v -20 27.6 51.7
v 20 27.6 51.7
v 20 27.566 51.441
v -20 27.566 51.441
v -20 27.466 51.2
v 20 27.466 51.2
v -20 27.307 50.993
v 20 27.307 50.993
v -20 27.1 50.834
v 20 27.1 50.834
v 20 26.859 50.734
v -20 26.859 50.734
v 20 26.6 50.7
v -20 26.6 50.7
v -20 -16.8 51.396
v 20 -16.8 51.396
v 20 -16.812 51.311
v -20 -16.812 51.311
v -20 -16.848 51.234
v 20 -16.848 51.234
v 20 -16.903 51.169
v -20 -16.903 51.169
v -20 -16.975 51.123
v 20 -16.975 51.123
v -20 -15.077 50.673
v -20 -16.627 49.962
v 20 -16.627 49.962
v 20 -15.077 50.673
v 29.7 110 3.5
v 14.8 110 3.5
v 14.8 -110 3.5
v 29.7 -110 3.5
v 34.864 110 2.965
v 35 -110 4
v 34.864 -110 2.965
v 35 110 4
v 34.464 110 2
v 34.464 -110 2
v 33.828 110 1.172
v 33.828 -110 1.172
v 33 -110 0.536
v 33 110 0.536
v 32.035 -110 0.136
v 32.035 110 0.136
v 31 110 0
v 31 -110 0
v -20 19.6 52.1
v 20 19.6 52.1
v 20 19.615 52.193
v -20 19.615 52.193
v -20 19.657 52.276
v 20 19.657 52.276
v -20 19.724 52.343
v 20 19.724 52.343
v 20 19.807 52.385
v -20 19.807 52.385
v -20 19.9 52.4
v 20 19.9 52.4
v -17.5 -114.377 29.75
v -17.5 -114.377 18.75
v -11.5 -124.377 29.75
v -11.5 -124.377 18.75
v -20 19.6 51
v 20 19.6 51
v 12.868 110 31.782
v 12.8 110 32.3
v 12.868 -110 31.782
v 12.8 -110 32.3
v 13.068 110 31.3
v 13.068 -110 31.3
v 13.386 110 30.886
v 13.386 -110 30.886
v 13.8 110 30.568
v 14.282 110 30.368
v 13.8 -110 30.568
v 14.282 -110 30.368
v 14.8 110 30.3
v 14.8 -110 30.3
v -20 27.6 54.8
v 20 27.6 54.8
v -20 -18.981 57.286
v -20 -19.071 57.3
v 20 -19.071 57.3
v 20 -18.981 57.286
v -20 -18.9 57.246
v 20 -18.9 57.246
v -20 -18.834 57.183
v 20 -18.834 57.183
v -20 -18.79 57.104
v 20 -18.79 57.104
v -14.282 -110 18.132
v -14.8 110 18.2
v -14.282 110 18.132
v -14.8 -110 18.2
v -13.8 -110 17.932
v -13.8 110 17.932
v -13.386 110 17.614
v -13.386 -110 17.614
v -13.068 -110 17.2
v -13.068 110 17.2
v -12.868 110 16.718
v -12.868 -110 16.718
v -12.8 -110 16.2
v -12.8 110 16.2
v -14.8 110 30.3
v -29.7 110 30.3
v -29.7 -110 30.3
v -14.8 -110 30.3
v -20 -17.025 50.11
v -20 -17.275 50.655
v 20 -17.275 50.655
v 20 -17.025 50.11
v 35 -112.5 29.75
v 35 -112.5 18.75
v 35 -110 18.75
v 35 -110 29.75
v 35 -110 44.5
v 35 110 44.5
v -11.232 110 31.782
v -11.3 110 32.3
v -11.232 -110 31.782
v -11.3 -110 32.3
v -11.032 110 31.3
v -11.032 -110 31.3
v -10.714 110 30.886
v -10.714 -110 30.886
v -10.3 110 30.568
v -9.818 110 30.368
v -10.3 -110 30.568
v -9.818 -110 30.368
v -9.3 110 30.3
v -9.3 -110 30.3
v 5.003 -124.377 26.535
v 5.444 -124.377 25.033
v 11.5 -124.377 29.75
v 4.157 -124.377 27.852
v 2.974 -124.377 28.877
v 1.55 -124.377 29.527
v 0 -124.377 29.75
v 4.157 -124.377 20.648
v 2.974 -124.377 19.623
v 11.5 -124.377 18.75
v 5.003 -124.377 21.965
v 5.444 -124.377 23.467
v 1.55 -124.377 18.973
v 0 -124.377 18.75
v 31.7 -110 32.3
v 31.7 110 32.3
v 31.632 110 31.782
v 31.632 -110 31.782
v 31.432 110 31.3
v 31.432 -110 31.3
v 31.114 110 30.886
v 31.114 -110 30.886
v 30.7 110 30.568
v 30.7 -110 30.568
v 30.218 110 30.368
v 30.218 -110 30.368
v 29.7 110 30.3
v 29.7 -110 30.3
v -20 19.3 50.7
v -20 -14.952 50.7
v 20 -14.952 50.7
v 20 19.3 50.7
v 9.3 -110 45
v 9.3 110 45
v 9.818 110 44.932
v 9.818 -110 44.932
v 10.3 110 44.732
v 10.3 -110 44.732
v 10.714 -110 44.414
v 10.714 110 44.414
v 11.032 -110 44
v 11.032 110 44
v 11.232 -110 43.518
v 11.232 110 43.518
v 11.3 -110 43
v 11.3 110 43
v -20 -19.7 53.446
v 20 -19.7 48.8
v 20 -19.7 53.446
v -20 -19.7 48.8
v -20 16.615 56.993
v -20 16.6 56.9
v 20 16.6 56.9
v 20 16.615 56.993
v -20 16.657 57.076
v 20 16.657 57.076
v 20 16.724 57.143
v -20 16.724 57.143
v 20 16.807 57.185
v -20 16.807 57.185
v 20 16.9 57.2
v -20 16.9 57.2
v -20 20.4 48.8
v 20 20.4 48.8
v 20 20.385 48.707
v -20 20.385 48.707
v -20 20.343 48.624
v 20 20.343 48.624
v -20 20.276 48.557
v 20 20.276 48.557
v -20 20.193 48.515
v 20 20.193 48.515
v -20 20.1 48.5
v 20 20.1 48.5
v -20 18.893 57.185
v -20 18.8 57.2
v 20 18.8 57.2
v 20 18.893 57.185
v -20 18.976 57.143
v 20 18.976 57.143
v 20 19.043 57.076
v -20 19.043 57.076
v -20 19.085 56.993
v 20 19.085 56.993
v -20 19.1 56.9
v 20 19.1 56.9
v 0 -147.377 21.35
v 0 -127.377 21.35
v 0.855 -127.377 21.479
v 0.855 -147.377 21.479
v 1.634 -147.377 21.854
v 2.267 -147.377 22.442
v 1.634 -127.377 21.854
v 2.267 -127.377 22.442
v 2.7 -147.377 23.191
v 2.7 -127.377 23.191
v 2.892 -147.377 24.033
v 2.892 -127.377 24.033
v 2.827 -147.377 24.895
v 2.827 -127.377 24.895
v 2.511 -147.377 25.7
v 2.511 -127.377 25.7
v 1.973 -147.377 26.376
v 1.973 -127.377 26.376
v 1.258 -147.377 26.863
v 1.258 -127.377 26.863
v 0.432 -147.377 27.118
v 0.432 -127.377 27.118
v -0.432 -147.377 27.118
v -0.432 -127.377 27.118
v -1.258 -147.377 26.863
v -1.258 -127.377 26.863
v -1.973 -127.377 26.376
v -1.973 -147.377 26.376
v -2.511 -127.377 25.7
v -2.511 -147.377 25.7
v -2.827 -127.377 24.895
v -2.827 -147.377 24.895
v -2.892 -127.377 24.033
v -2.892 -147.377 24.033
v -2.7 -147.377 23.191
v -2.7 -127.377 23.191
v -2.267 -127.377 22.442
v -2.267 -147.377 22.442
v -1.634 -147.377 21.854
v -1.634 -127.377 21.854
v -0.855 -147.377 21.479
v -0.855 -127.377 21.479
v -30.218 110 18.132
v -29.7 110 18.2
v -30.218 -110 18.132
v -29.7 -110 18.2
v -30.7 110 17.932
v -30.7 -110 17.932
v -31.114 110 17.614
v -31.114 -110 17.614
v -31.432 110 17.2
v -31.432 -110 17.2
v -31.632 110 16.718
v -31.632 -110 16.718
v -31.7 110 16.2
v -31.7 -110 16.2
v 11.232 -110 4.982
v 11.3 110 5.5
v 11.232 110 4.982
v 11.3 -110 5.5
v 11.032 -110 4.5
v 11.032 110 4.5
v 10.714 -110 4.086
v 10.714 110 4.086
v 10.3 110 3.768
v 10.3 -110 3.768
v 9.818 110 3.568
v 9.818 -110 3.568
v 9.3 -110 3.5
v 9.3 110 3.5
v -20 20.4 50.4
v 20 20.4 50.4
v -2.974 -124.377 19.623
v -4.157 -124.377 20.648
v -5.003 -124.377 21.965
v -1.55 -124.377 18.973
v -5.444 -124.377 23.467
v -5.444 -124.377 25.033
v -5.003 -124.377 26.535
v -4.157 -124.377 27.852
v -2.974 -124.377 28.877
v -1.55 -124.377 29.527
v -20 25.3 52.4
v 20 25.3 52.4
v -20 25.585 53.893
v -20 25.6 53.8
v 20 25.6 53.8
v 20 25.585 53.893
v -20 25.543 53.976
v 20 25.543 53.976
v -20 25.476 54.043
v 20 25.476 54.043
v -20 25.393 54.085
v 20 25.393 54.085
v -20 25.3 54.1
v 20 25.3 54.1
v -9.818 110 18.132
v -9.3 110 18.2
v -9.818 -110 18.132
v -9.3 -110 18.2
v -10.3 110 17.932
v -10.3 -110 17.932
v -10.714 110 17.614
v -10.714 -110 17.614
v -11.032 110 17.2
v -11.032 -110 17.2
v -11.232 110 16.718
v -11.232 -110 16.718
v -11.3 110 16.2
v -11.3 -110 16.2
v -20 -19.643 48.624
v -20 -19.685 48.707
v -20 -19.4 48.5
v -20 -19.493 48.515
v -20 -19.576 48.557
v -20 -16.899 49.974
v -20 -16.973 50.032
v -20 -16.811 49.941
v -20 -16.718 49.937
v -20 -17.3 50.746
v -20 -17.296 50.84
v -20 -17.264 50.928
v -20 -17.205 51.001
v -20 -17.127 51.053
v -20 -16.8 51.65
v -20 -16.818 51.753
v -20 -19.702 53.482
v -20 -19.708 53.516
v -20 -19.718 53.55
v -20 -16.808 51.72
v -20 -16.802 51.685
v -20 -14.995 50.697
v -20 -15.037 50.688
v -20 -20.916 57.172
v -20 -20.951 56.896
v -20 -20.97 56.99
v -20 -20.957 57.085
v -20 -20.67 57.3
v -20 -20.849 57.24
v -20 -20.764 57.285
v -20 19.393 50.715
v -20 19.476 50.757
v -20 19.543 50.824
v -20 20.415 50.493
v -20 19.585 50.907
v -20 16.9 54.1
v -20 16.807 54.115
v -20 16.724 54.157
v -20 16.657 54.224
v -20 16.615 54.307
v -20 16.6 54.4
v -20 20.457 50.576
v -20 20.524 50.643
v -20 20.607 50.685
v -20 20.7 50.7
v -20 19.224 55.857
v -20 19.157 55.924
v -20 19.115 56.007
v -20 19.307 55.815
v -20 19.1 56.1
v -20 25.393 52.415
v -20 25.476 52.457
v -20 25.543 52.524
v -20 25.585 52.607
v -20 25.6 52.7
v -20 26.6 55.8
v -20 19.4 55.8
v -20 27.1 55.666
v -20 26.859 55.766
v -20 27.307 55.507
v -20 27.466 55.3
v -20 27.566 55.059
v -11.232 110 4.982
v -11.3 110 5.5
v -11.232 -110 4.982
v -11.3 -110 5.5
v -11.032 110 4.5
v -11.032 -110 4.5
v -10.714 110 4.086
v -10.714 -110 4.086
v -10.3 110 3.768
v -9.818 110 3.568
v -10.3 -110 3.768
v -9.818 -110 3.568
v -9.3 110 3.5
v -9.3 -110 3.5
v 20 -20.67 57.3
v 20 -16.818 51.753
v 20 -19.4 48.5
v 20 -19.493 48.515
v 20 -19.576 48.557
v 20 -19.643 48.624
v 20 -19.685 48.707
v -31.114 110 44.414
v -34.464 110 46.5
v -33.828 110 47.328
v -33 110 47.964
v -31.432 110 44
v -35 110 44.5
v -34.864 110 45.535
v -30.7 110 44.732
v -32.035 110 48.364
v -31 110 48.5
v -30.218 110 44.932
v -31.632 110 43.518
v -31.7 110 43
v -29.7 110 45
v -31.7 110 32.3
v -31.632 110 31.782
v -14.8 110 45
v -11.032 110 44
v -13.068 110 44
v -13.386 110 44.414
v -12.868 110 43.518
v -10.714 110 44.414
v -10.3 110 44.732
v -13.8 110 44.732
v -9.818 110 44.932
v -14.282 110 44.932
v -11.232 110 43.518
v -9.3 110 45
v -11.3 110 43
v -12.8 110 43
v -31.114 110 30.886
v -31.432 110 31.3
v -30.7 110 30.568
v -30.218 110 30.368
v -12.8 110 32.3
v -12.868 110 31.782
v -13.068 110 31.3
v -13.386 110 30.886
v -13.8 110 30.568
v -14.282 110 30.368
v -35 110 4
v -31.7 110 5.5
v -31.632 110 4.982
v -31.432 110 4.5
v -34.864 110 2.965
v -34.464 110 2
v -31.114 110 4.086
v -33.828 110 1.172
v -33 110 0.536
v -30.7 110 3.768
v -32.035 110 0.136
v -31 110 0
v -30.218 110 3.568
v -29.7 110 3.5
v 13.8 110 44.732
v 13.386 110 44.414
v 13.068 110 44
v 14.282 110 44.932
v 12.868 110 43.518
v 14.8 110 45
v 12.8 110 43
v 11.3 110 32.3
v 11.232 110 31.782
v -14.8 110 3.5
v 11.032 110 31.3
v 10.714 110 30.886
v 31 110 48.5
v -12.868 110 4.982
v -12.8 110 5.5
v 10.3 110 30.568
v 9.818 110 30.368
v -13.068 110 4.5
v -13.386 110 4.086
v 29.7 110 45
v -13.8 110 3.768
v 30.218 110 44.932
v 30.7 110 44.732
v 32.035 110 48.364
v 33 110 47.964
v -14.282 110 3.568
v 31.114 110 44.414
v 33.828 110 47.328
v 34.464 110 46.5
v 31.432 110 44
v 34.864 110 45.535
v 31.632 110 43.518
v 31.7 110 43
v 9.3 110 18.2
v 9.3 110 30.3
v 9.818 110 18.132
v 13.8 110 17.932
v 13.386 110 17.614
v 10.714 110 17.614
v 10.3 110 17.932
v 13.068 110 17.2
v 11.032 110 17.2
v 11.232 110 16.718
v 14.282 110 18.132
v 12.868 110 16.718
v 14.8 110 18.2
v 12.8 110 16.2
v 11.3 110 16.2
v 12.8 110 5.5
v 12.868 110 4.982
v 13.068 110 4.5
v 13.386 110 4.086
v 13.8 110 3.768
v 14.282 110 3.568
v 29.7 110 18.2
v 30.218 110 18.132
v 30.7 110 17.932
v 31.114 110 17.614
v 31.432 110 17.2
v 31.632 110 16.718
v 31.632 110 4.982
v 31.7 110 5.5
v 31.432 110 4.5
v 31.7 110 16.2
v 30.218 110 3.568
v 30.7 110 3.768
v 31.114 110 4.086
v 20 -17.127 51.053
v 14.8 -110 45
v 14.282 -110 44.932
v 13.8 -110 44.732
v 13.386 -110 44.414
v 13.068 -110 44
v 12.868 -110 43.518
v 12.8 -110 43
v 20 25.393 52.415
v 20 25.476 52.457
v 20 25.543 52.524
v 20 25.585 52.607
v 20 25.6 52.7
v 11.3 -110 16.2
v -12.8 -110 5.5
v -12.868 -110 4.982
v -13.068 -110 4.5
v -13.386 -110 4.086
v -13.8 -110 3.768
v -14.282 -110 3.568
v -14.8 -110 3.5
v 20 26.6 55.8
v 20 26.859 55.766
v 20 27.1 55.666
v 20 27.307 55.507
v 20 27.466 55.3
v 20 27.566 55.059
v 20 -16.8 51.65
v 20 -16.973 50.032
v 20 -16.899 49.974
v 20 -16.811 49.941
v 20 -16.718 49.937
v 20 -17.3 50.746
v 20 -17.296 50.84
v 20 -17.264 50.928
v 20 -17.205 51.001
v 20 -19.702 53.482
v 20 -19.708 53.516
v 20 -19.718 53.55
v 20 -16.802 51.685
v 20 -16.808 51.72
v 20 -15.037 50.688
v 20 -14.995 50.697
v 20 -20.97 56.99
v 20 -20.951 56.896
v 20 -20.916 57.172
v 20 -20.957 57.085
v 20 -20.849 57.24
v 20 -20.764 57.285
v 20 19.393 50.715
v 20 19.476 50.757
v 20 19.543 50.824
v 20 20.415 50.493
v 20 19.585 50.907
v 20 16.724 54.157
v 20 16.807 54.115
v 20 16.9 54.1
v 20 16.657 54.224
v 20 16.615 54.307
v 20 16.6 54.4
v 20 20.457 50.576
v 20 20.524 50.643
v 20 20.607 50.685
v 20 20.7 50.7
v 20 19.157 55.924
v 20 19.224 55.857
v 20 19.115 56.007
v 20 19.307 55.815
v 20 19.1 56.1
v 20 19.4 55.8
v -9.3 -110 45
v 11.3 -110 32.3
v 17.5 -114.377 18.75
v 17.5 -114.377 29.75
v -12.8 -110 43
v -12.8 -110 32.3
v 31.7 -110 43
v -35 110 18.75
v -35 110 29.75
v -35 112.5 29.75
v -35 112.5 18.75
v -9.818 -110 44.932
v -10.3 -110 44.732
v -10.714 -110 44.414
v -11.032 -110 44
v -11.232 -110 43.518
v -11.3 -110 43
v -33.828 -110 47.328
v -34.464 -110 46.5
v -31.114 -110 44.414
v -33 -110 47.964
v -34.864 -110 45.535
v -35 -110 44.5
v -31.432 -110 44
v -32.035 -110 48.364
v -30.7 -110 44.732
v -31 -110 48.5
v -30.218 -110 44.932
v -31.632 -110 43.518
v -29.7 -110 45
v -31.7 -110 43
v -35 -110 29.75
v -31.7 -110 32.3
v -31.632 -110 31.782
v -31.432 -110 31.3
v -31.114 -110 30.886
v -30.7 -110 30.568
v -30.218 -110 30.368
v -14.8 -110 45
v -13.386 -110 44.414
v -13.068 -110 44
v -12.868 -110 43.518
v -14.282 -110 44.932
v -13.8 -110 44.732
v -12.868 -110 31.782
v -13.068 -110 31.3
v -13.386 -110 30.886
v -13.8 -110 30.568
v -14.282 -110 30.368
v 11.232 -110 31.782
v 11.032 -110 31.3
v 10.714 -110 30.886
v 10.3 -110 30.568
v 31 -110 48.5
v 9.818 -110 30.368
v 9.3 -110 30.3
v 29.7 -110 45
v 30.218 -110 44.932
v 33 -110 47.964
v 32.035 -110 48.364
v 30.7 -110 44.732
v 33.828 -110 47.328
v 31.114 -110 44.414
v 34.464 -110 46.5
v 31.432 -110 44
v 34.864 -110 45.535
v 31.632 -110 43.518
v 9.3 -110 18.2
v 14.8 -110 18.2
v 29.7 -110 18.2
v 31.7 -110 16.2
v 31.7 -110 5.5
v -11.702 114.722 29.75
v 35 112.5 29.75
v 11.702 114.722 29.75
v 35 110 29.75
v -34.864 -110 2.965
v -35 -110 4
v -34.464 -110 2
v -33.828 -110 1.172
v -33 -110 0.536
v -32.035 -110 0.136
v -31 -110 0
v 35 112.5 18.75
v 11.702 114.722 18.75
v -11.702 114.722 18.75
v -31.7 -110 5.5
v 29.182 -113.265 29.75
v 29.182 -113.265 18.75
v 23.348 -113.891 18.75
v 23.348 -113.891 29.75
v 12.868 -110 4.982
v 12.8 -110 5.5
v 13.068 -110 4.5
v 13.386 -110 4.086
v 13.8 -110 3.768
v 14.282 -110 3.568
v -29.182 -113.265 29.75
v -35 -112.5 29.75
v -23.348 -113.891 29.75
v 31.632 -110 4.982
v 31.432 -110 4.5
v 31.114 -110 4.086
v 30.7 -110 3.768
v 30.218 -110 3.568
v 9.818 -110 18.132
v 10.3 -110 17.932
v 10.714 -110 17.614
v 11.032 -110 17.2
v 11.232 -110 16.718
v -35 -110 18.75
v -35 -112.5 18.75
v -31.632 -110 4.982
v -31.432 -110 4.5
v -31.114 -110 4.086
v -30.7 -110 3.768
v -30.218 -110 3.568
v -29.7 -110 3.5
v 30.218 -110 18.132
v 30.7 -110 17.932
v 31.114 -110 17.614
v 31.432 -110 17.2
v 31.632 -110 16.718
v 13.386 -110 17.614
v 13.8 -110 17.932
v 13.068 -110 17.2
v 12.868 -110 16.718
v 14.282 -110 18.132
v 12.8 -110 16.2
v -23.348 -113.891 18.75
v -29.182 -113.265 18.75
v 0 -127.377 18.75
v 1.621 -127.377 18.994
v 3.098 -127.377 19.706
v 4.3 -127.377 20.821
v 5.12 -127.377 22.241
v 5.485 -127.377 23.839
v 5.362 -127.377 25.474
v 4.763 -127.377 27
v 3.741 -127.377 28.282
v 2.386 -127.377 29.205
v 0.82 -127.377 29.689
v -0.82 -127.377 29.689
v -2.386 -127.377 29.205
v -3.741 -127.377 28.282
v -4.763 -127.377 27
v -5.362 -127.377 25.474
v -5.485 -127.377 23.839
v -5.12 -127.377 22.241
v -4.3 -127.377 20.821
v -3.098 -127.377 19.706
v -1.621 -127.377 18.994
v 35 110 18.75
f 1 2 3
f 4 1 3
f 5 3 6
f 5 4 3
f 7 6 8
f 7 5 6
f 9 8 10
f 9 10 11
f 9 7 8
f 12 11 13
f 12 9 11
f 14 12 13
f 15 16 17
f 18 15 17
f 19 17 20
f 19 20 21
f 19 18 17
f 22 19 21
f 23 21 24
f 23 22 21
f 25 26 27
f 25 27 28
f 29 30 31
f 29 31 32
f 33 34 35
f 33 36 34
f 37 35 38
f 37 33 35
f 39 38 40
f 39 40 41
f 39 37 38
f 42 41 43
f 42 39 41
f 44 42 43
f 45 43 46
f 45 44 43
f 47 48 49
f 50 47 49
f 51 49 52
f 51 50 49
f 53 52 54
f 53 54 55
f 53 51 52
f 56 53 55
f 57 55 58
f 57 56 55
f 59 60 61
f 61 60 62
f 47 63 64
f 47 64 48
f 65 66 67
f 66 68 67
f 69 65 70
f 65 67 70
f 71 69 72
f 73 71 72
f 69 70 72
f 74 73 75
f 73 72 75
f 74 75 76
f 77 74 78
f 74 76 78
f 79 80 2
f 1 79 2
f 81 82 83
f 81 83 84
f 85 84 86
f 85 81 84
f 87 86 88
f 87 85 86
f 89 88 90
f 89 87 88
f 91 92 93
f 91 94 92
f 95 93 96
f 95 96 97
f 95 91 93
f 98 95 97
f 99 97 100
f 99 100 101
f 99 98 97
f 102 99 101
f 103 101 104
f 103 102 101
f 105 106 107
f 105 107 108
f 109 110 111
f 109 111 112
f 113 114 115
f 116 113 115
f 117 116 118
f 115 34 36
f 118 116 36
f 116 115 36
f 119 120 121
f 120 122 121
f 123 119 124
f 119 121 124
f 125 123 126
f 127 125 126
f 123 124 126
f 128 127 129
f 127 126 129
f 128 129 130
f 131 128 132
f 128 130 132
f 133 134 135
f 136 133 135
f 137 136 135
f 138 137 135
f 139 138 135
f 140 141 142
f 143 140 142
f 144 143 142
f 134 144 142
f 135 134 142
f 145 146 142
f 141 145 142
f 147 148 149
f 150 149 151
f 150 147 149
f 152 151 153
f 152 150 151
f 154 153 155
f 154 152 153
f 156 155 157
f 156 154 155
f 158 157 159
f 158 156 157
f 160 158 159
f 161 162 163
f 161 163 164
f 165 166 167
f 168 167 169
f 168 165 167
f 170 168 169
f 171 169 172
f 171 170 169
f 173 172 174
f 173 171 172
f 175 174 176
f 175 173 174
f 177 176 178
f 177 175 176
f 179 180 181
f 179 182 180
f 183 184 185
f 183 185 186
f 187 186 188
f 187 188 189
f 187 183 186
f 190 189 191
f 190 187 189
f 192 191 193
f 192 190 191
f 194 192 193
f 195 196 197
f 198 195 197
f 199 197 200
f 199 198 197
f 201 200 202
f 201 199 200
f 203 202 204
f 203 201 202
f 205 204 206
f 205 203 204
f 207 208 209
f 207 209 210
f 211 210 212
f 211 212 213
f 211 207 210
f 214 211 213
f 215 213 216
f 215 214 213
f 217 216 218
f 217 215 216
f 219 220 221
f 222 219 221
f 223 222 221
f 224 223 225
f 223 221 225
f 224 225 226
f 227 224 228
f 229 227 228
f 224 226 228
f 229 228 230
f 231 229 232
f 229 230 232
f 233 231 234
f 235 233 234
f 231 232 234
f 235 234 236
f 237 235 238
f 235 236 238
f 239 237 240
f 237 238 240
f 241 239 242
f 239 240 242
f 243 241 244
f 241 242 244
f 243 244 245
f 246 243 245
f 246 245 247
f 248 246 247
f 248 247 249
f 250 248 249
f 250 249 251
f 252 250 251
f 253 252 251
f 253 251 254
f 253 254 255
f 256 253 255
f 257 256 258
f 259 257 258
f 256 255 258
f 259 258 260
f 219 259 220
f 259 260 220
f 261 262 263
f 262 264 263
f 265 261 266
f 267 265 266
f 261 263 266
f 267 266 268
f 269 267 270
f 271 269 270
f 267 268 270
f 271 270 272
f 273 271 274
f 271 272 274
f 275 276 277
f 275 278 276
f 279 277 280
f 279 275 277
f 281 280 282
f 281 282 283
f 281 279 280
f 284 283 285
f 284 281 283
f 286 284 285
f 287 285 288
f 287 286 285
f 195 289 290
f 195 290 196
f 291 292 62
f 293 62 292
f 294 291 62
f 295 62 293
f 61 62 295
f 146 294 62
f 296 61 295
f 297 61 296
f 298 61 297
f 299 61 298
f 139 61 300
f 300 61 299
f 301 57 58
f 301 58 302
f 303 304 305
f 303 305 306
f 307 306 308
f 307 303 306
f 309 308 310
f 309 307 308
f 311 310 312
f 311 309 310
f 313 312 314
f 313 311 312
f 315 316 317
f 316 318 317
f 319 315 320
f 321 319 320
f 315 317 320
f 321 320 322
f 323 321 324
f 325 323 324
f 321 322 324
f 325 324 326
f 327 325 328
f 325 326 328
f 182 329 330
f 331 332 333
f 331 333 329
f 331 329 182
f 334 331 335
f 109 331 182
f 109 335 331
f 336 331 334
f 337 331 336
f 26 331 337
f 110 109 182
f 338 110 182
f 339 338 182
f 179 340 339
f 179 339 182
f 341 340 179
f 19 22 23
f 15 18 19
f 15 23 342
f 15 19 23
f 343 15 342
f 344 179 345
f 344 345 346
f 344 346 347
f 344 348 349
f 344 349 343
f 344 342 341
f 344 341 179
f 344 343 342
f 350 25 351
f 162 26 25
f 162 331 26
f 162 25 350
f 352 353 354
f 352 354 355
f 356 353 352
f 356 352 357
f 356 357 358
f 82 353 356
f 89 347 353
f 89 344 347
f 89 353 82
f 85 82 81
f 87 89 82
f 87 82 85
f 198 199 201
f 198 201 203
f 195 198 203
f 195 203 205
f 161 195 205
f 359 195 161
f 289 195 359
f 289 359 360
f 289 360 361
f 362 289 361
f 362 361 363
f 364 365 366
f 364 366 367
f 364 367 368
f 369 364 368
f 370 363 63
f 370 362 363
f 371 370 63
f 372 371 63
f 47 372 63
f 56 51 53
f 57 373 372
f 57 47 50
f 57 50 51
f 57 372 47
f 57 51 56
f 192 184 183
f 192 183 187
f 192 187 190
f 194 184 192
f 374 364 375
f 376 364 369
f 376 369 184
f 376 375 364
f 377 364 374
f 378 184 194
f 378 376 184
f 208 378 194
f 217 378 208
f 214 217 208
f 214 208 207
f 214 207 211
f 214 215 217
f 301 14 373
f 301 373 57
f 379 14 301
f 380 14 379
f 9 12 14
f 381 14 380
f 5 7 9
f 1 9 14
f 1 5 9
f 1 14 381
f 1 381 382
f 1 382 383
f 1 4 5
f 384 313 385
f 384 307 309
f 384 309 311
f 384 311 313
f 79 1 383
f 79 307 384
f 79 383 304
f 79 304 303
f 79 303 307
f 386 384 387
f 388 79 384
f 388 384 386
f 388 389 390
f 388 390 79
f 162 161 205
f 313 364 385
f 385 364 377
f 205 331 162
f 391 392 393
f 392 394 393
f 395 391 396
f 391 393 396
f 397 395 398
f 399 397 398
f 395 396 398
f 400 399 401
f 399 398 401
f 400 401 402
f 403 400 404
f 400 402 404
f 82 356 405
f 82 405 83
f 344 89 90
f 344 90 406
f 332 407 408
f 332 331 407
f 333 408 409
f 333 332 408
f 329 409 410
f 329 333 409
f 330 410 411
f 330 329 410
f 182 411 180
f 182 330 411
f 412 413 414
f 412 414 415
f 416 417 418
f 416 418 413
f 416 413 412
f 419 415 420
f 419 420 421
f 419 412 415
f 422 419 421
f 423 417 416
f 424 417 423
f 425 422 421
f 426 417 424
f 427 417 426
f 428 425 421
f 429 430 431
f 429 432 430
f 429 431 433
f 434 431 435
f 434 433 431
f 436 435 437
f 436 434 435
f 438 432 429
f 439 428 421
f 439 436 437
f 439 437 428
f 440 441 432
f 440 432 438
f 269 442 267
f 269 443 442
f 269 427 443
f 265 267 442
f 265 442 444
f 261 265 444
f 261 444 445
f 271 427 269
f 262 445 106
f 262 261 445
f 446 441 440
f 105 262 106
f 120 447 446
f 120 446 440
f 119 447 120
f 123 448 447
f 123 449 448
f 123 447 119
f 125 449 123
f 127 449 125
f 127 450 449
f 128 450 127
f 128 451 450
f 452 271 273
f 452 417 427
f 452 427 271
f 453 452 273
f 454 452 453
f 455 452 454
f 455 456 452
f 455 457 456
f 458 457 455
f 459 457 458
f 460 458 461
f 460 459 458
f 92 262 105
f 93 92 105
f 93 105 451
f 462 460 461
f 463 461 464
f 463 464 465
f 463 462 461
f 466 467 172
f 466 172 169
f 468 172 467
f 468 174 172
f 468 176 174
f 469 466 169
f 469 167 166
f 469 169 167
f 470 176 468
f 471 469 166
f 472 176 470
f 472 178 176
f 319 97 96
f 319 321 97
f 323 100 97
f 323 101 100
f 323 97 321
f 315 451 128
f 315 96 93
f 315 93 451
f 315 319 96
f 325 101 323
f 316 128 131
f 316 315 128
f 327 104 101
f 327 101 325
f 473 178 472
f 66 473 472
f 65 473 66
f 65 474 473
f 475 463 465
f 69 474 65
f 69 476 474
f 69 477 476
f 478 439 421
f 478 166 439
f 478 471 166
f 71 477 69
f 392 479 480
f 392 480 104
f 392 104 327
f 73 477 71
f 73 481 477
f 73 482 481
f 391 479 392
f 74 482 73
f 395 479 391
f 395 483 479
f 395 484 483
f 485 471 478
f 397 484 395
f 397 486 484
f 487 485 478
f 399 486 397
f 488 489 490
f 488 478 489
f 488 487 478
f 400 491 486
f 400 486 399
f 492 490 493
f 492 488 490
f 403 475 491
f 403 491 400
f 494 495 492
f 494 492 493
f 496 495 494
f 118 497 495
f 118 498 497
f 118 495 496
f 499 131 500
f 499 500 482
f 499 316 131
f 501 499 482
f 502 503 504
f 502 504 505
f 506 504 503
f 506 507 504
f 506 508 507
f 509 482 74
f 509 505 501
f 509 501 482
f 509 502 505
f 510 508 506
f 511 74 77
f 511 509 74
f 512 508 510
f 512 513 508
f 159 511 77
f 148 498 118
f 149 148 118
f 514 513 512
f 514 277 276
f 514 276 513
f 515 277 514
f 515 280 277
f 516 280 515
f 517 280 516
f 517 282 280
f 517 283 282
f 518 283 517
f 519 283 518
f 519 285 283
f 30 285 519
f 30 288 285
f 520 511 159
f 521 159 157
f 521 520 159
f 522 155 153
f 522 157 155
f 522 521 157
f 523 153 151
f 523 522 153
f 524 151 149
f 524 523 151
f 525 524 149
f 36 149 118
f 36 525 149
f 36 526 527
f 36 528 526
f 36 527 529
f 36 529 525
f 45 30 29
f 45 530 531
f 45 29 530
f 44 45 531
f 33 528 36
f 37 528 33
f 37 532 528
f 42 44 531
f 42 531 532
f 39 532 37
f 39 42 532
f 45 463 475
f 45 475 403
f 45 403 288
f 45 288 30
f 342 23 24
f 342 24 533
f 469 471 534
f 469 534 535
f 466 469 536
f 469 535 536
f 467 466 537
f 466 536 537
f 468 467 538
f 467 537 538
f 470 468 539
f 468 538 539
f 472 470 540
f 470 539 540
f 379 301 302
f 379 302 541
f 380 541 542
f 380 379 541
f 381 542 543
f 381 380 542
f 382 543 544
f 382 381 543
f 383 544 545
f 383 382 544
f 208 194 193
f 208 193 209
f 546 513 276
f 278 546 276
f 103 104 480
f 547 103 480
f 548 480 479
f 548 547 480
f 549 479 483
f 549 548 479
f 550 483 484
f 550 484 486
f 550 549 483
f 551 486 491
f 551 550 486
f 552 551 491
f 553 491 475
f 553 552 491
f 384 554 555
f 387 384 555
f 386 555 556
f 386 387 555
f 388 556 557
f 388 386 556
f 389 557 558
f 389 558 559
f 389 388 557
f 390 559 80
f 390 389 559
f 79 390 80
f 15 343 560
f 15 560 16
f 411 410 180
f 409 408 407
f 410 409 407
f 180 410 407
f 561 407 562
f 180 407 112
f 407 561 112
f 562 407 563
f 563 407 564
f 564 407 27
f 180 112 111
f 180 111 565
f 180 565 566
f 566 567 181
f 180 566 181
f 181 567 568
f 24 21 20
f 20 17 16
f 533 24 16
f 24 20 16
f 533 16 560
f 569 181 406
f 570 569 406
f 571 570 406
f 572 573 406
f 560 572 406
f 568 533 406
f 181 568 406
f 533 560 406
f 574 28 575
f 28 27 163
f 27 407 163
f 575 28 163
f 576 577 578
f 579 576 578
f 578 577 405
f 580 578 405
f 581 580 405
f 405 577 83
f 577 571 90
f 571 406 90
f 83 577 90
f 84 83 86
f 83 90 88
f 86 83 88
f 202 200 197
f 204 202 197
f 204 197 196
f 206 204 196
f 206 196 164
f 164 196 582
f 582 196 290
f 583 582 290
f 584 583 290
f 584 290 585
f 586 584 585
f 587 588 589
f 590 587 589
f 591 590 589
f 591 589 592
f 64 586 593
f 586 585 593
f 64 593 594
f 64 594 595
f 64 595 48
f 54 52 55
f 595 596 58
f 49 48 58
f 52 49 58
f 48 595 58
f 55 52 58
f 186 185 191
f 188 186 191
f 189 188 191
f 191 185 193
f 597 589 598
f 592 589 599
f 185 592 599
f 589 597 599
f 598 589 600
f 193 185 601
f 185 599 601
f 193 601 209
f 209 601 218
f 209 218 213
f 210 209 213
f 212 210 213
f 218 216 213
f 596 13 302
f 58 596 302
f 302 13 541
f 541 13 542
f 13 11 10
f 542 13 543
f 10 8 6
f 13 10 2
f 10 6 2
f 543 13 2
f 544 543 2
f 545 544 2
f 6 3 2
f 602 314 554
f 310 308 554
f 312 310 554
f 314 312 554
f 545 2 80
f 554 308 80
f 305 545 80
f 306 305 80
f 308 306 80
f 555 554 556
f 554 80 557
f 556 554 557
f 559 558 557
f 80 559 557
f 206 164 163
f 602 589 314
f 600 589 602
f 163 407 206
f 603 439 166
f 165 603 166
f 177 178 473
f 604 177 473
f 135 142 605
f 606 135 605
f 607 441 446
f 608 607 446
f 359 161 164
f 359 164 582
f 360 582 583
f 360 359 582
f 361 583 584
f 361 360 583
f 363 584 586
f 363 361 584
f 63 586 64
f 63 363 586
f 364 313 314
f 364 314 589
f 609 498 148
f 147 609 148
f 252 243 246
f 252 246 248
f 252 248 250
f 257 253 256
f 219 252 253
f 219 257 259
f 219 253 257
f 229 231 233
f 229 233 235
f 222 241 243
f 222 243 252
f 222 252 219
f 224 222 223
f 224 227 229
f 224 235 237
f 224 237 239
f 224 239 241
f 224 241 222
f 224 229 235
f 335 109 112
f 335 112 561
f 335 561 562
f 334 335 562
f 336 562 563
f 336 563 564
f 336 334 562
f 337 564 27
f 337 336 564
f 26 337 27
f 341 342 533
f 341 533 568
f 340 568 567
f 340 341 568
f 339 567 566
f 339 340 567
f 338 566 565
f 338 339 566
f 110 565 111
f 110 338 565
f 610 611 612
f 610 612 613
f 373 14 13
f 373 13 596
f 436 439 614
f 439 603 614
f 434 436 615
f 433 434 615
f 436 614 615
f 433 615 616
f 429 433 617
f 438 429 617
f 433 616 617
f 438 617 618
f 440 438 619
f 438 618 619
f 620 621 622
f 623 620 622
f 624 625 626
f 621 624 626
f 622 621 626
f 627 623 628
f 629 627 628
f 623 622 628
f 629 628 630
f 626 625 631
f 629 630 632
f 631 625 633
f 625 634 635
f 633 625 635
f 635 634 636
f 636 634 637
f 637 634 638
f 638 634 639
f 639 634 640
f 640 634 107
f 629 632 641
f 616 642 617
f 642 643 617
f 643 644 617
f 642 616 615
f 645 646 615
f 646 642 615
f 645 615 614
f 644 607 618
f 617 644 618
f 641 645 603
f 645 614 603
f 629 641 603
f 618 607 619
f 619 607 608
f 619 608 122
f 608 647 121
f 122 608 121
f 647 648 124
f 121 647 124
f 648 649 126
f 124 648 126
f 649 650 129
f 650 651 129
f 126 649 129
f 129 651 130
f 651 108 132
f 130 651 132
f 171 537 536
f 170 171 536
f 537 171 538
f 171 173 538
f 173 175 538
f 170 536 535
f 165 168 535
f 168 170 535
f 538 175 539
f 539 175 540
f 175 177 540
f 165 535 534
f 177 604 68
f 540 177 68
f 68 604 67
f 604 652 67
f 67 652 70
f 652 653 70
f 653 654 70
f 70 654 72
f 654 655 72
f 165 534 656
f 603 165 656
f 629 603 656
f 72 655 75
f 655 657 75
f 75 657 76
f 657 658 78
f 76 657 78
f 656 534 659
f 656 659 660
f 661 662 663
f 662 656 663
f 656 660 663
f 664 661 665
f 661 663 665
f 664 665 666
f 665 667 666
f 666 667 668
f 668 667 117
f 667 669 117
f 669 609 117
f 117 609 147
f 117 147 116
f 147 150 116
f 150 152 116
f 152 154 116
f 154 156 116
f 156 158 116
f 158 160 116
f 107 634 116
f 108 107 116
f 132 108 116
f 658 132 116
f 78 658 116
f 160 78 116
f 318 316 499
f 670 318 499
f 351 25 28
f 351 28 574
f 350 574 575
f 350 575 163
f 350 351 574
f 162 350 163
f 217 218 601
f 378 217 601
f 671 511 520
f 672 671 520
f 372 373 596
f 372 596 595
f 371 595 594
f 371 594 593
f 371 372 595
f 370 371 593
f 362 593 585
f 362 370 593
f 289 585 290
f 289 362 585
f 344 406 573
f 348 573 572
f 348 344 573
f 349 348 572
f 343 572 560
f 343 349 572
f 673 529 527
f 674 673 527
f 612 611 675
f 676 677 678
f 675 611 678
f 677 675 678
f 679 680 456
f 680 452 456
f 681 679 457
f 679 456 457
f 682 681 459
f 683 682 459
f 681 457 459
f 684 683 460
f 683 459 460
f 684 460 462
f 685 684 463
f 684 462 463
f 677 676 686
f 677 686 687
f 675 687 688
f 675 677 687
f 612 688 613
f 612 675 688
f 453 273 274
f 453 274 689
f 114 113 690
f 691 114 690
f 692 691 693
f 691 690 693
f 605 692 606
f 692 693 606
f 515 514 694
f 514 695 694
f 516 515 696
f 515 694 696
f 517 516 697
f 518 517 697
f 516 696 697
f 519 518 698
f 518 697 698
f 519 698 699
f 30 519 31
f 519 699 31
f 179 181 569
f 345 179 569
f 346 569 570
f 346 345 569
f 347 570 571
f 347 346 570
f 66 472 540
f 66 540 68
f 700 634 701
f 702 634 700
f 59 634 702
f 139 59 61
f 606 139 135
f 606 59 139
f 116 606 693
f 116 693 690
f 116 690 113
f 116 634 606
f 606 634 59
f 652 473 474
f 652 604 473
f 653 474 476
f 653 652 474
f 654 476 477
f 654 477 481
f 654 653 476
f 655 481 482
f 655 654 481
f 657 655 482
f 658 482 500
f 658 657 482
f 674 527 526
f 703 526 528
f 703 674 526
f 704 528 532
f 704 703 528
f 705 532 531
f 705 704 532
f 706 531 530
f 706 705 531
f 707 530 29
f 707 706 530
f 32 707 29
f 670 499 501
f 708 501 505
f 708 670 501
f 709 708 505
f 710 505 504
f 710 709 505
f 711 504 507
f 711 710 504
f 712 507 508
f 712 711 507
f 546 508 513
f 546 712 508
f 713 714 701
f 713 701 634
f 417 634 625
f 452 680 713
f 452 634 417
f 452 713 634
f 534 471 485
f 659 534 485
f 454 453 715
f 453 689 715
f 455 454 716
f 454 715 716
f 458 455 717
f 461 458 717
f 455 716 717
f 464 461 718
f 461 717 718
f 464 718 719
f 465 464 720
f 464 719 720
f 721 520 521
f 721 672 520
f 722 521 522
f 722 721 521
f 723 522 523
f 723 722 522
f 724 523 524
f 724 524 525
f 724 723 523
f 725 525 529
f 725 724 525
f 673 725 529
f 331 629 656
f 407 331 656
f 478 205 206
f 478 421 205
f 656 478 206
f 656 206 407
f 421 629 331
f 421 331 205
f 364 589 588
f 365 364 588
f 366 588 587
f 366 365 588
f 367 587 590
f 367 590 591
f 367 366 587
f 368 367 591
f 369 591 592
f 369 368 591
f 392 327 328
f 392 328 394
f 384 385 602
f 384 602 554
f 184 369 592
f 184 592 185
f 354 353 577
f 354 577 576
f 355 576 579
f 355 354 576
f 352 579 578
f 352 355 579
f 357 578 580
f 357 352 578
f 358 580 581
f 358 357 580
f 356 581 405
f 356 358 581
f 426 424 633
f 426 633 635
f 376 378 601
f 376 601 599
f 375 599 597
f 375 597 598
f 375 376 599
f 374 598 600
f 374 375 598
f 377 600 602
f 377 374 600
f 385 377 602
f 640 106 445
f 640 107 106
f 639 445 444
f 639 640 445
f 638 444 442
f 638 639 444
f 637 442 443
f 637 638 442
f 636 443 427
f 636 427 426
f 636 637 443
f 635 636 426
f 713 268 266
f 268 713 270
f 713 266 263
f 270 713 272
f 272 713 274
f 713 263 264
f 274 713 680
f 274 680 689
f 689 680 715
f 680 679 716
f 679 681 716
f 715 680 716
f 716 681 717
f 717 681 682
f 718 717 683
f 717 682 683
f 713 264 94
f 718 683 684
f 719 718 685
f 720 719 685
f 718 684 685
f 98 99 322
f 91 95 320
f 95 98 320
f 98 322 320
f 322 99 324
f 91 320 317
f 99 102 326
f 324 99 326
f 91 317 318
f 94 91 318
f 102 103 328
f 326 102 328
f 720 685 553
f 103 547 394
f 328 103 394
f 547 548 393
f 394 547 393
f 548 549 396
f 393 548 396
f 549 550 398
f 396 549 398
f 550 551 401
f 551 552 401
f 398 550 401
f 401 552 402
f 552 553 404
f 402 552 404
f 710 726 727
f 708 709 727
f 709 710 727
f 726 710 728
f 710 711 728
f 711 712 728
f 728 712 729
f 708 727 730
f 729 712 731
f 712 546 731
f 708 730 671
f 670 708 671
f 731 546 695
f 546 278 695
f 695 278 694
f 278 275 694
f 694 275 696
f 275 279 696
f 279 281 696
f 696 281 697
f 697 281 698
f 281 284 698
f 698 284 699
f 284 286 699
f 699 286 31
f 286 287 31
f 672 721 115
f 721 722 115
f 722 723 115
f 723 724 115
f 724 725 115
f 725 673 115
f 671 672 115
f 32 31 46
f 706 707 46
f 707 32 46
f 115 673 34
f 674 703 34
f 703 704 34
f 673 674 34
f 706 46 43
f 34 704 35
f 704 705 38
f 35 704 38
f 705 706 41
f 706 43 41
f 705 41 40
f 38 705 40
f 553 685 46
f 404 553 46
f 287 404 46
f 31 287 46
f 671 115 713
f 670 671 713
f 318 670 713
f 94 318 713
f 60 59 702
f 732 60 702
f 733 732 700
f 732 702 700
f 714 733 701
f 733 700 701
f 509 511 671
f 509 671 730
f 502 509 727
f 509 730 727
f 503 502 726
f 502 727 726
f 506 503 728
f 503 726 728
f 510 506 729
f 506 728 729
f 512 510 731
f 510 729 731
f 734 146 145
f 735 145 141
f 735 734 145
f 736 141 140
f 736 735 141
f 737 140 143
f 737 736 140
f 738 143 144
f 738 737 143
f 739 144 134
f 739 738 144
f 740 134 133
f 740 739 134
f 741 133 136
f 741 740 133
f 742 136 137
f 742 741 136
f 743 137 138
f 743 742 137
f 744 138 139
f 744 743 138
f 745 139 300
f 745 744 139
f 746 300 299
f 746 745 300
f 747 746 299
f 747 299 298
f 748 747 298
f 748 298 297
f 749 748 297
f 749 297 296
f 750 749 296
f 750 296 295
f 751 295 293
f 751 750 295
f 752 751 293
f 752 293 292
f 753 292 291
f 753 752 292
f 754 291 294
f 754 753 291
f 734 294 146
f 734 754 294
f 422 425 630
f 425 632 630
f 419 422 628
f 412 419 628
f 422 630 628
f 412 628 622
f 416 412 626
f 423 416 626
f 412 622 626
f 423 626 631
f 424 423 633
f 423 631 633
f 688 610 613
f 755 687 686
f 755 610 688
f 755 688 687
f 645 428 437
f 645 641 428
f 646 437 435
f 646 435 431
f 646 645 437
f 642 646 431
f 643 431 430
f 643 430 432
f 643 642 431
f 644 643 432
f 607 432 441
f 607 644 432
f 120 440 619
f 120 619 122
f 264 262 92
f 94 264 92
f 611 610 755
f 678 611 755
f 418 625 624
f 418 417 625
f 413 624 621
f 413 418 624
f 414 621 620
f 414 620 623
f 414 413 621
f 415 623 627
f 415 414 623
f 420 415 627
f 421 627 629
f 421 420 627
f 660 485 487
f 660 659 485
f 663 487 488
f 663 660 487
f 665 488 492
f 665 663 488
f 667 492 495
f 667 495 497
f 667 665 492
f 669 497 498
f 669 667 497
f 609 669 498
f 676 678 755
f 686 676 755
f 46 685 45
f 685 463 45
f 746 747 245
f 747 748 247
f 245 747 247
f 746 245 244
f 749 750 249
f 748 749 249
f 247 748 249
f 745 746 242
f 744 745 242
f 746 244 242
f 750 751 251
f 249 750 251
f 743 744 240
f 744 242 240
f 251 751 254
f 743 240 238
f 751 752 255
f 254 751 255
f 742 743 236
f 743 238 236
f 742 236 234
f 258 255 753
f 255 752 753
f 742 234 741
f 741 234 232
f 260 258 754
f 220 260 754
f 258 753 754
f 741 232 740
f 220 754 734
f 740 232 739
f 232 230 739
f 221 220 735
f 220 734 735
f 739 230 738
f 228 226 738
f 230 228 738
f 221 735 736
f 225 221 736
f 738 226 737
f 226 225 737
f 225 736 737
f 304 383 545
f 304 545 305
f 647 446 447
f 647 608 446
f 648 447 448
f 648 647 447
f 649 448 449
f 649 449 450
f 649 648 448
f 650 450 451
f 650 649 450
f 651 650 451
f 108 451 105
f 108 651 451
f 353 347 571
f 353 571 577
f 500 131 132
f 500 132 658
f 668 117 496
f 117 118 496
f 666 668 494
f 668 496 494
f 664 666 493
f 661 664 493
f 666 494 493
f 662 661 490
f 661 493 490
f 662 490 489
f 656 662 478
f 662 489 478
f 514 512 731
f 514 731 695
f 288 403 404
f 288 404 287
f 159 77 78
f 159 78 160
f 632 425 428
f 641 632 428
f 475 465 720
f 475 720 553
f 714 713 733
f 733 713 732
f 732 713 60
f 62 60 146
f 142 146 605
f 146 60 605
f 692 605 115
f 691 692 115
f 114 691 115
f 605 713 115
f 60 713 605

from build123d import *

# Parameters (mm, degrees)
SKETCH_1_W                  = 70
SKETCH_1_H                  = 220
EXTRUDE_1_DEPTH             = 48.5
CUT_EXTRUDE_1_REACH         = 222
SKETCH_2_W                  = 22.6
SKETCH_2_H                  = 14.7
SKETCH_2_W_2                = 18.9
SKETCH_3_W                  = 70
SKETCH_3_H                  = 11
EXTRUDE_2_DEPTH             = 5
CUT_EXTRUDE_4_DEPTH         = 11
EXTRUDE_3_REACH             = 26.25
EXTRUDE_3_DIRECTION_2_REACH = 26.25
EXTRUDE_6_DEPTH             = 20
FILLET_1_R                  = 4
FILLET_2_R                  = 2
SKETCH_13_OUTSIDE_W         = 123.742
SKETCH_13_OUTSIDE_H         = 111.042
SKETCH_13_OUTSIDE_R         = 5.5
CUT_EXTRUDE_8_DEPTH         = 3
SKETCH_14_R                 = 2.9
EXTRUDE_7_DEPTH             = 20


with BuildPart() as part:
    # Эскиз1 → Бобышка-Вытянуть1 (new body)
    with BuildSketch(Plane.XY):
        Rectangle(SKETCH_1_W, SKETCH_1_H)
    extrude(amount=EXTRUDE_1_DEPTH)

    # Эскиз2 → Вырез-Вытянуть1 (cut, up to next)
    with BuildSketch(Plane(origin=(0, 110, 0), x_dir=(1, 0, 0), z_dir=(0, 1, 0)), mode=Mode.PRIVATE) as cut_extrude_1_sk1:
        with Locations((0, -10.85)):
            Rectangle(SKETCH_2_W, SKETCH_2_H)
    cut_extrude_1_tool1 = extrude(cut_extrude_1_sk1.sketch, amount=-CUT_EXTRUDE_1_REACH, mode=Mode.PRIVATE) & part.part
    add(cut_extrude_1_tool1.solids().sort_by_distance((0, 110, 10.85))[0], mode=Mode.SUBTRACT)
    # Эскиз2 → Вырез-Вытянуть1 (cut, up to next)
    with BuildSketch(Plane(origin=(0, 110, 0), x_dir=(1, 0, 0), z_dir=(0, 1, 0)), mode=Mode.PRIVATE) as cut_extrude_1_sk2:
        with Locations((22.25, -10.85)):
            Rectangle(SKETCH_2_W_2, SKETCH_2_H)
    cut_extrude_1_tool2 = extrude(cut_extrude_1_sk2.sketch, amount=-CUT_EXTRUDE_1_REACH, mode=Mode.PRIVATE) & part.part
    add(cut_extrude_1_tool2.solids().sort_by_distance((22.25, 110, 10.85))[0], mode=Mode.SUBTRACT)
    # Эскиз2 → Вырез-Вытянуть1 (cut, up to next)
    with BuildSketch(Plane(origin=(0, 110, 0), x_dir=(1, 0, 0), z_dir=(0, 1, 0)), mode=Mode.PRIVATE) as cut_extrude_1_sk3:
        with Locations((-22.25, -10.85)):
            Rectangle(SKETCH_2_W_2, SKETCH_2_H)
    cut_extrude_1_tool3 = extrude(cut_extrude_1_sk3.sketch, amount=-CUT_EXTRUDE_1_REACH, mode=Mode.PRIVATE) & part.part
    add(cut_extrude_1_tool3.solids().sort_by_distance((-22.25, 110, 10.85))[0], mode=Mode.SUBTRACT)
    # Эскиз2 → Вырез-Вытянуть1 (cut, up to next)
    with BuildSketch(Plane(origin=(0, 110, 0), x_dir=(1, 0, 0), z_dir=(0, 1, 0)), mode=Mode.PRIVATE) as cut_extrude_1_sk4:
        with Locations((22.25, -37.65)):
            Rectangle(SKETCH_2_W_2, SKETCH_2_H)
    cut_extrude_1_tool4 = extrude(cut_extrude_1_sk4.sketch, amount=-CUT_EXTRUDE_1_REACH, mode=Mode.PRIVATE) & part.part
    add(cut_extrude_1_tool4.solids().sort_by_distance((22.25, 110, 37.65))[0], mode=Mode.SUBTRACT)
    # Эскиз2 → Вырез-Вытянуть1 (cut, up to next)
    with BuildSketch(Plane(origin=(0, 110, 0), x_dir=(1, 0, 0), z_dir=(0, 1, 0)), mode=Mode.PRIVATE) as cut_extrude_1_sk5:
        with Locations((0, -37.65)):
            Rectangle(SKETCH_2_W, SKETCH_2_H)
    cut_extrude_1_tool5 = extrude(cut_extrude_1_sk5.sketch, amount=-CUT_EXTRUDE_1_REACH, mode=Mode.PRIVATE) & part.part
    add(cut_extrude_1_tool5.solids().sort_by_distance((0, 110, 37.65))[0], mode=Mode.SUBTRACT)
    # Эскиз2 → Вырез-Вытянуть1 (cut, up to next)
    with BuildSketch(Plane(origin=(0, 110, 0), x_dir=(1, 0, 0), z_dir=(0, 1, 0)), mode=Mode.PRIVATE) as cut_extrude_1_sk6:
        with Locations((-22.25, -37.65)):
            Rectangle(SKETCH_2_W_2, SKETCH_2_H)
    cut_extrude_1_tool6 = extrude(cut_extrude_1_sk6.sketch, amount=-CUT_EXTRUDE_1_REACH, mode=Mode.PRIVATE) & part.part
    add(cut_extrude_1_tool6.solids().sort_by_distance((-22.25, 110, 37.65))[0], mode=Mode.SUBTRACT)


with BuildPart() as body_2:
    # Эскиз3 → Бобышка-Вытянуть2 (new body)
    with BuildSketch(Plane(origin=(0, 110, 0), x_dir=(1, 0, 0), z_dir=(0, 1, 0))):
        with Locations((0, -24.25)):
            Rectangle(SKETCH_3_W, SKETCH_3_H)
    extrude_2 = extrude(amount=EXTRUDE_2_DEPTH)

    # Эскиз4 → Вырез-Вытянуть4 (cut)
    with BuildSketch(Plane.XY.offset(29.75)):
        with BuildLine():
            Line((-35, 112.5), (-35, 118.5))
            Line((-35, 118.5), (35, 118.5))
            Line((35, 118.5), (35, 112.5))
            ThreePointArc((35, 112.5), (0, 115), (-35, 112.5))
        make_face()
    cut_extrude_4 = extrude(amount=-CUT_EXTRUDE_4_DEPTH, mode=Mode.SUBTRACT)


with BuildPart() as part_1:
    add(part.part)

    # Зеркальное отражение2: Бобышка-Вытянуть2, Вырез-Вытянуть4 across plane
    add(extrude_2.mirror(Plane.ZX))
    add(cut_extrude_4.mirror(Plane.ZX), mode=Mode.SUBTRACT)

    # Бобышка-Вытянуть3: up to this face of the body (flat: up to its plane)
    extrude_3_end = Plane(part_1.part.faces().sort_by_distance((0, -112.150725053, 18.75))[0])
    # Эскиз5 → Бобышка-Вытянуть3 (add, up to the picked face)
    with BuildSketch(Plane(origin=(0, 0, 24.25), x_dir=(-1, 0, 0), z_dir=(0, 0, -1)), mode=Mode.PRIVATE) as extrude_3_sk1:
        with BuildLine():
            Line((-11.5, -124.377385485), (-17.5, -114.377385485))
            ThreePointArc((-17.5, -114.377385485), (0, -115), (17.5, -114.377385485))
            Line((17.5, -114.377385485), (11.5, -124.377385485))
            Line((11.5, -124.377385485), (6.15, -124.377385485))
            Line((6.15, -124.377385485), (6.15, -127.377385485))
            Line((6.15, -127.377385485), (-6.15, -127.377385485))
            Line((-6.15, -127.377385485), (-6.15, -124.377385485))
            Line((-6.15, -124.377385485), (-11.5, -124.377385485))
        make_face()
    extrude_3_tool1 = split(extrude(extrude_3_sk1.sketch, amount=EXTRUDE_3_REACH, mode=Mode.PRIVATE), bisect_by=extrude_3_end, keep=Keep.BOTH, mode=Mode.PRIVATE)
    add(extrude_3_tool1.solids().sort_by(Axis((0, -120.046106, 24.25), (0, 0, -1)))[0])

    # Бобышка-Вытянуть3 direction 2: up to this face of the body (flat: up to its plane)
    extrude_3_direction_2_end = Plane(part_1.part.faces().sort_by_distance((0, -112.150725053, 29.75))[0])
    # Эскиз5 → Бобышка-Вытянуть3 direction 2 (add, up to the picked face)
    with BuildSketch(Plane(origin=(0, 0, 24.25), x_dir=(-1, 0, 0), z_dir=(0, 0, -1)), mode=Mode.PRIVATE) as extrude_3_direction_2_sk1:
        with BuildLine():
            Line((-11.5, -124.377385485), (-17.5, -114.377385485))
            ThreePointArc((-17.5, -114.377385485), (0, -115), (17.5, -114.377385485))
            Line((17.5, -114.377385485), (11.5, -124.377385485))
            Line((11.5, -124.377385485), (6.15, -124.377385485))
            Line((6.15, -124.377385485), (6.15, -127.377385485))
            Line((6.15, -127.377385485), (-6.15, -127.377385485))
            Line((-6.15, -127.377385485), (-6.15, -124.377385485))
            Line((-6.15, -124.377385485), (-11.5, -124.377385485))
        make_face()
    extrude_3_direction_2_tool1 = split(extrude(extrude_3_direction_2_sk1.sketch, amount=-EXTRUDE_3_DIRECTION_2_REACH, mode=Mode.PRIVATE), bisect_by=extrude_3_direction_2_end, keep=Keep.BOTH, mode=Mode.PRIVATE)
    add(extrude_3_direction_2_tool1.solids().sort_by(Axis((0, -120.046106, 24.25), (0, 0, 1)))[0])

    # Эскиз11 → Бобышка-Вытянуть6 (add, symmetric)
    with BuildSketch(Plane.ZY):
        with BuildLine():
            Line((48.8, -19.7), (53.446494712, -19.7))
            ThreePointArc((53.446494712, -19.7), (53.499168801, -19.704660466), (53.550206319, -19.718497065))
            Line((53.550206319, -19.718497065), (56.896288392, -20.951264145))
            ThreePointArc((56.896288392, -20.951264145), (57.171590381, -20.915844003), (57.3, -20.66976121))
            Line((57.3, -20.66976121), (57.3, -19.071198836))
            ThreePointArc((57.3, -19.071198836), (57.246082793, -18.899608455), (57.103711608, -18.789695901))
            Line((57.103711608, -18.789695901), (51.753314767, -16.818497065))
            ThreePointArc((51.753314767, -16.818497065), (51.702277249, -16.804660466), (51.649603159, -16.8))
            Line((51.649603159, -16.8), (51.395615132, -16.8))
            ThreePointArc((51.395615132, -16.8), (51.233596615, -16.847512377), (51.122897329, -16.975))
            Line((51.122897329, -16.975), (51.053098899, -17.127282197))
            ThreePointArc((51.053098899, -17.127282197), (50.884833356, -17.283511153), (50.655381096, -17.275))
            Line((50.655381096, -17.275), (50.10994549, -17.025))
            ThreePointArc((50.10994549, -17.025), (49.953716535, -16.856734457), (49.962227687, -16.627282197))
            Line((49.962227687, -16.627282197), (50.672717803, -15.077175771))
            ThreePointArc((50.672717803, -15.077175771), (50.693100103, -15.016147089), (50.7, -14.952175771))
            Line((50.7, -14.952175771), (50.7, 19.3))
            ThreePointArc((50.7, 19.3), (50.787867966, 19.512132034), (51, 19.6))
            Line((51, 19.6), (52.1, 19.6))
            ThreePointArc((52.1, 19.6), (52.312132034, 19.687867966), (52.4, 19.9))
            Line((52.4, 19.9), (52.4, 25.3))
            ThreePointArc((52.4, 25.3), (52.487867966, 25.512132034), (52.7, 25.6))
            Line((52.7, 25.6), (53.8, 25.6))
            ThreePointArc((53.8, 25.6), (54.012132034, 25.512132034), (54.1, 25.3))
            Line((54.1, 25.3), (54.1, 16.9))
            ThreePointArc((54.1, 16.9), (54.187867966, 16.687867966), (54.4, 16.6))
            Line((54.4, 16.6), (56.9, 16.6))
            ThreePointArc((56.9, 16.6), (57.112132034, 16.687867966), (57.2, 16.9))
            Line((57.2, 16.9), (57.2, 18.8))
            ThreePointArc((57.2, 18.8), (57.112132034, 19.012132034), (56.9, 19.1))
            Line((56.9, 19.1), (56.1, 19.1))
            ThreePointArc((56.1, 19.1), (55.887867966, 19.187867966), (55.8, 19.4))
            Line((55.8, 19.4), (55.8, 26.6))
            ThreePointArc((55.8, 26.6), (55.507106781, 27.307106781), (54.8, 27.6))
            Line((54.8, 27.6), (51.7, 27.6))
            ThreePointArc((51.7, 27.6), (50.992893219, 27.307106781), (50.7, 26.6))
            Line((50.7, 26.6), (50.7, 20.7))
            ThreePointArc((50.7, 20.7), (50.612132034, 20.487867966), (50.4, 20.4))
            Line((50.4, 20.4), (48.8, 20.4))
            ThreePointArc((48.8, 20.4), (48.587867966, 20.312132034), (48.5, 20.1))
            Line((48.5, 20.1), (48.5, -19.4))
            ThreePointArc((48.5, -19.4), (48.587867966, -19.612132034), (48.8, -19.7))
        make_face()
    extrude(amount=EXTRUDE_6_DEPTH, both=True)

    # Скругление1
    fillet_1_edges = [part_1.edges().sort_by_distance(p)[0] for p in [
        (-35, 0, 48.5),
        (35, 0, 48.5),
        (-35, 0, 0),
        (35, 0, 0),
    ]]
    fillet(fillet_1_edges, radius=FILLET_1_R)

    # Скругление2
    fillet_2_edges = [part_1.edges().sort_by_distance(p)[0] for p in [
        (31.7, 0, 3.5),
        (31.7, 0, 18.2),
        (12.8, 0, 18.2),
        (12.8, 0, 3.5),
        (-12.8, 0, 3.5),
        (-12.8, 0, 18.2),
        (-31.7, 0, 18.2),
        (-31.7, 0, 3.5),
        (12.8, 0, 45),
        (12.8, 0, 30.3),
        (31.7, 0, 30.3),
        (31.7, 0, 45),
        (-11.3, 0, 45),
        (-11.3, 0, 30.3),
        (11.3, 0, 30.3),
        (11.3, 0, 45),
        (-31.7, 0, 45),
        (-31.7, 0, 30.3),
        (-12.8, 0, 30.3),
        (-12.8, 0, 45),
        (11.3, 0, 3.5),
        (11.3, 0, 18.2),
        (-11.3, 0, 18.2),
        (-11.3, 0, 3.5),
    ]]
    fillet(fillet_2_edges, radius=FILLET_2_R)

    # Эскиз13 outside → Вырез-Вытянуть8 (cut)
    with BuildSketch(Plane.XZ.offset(127.377385485)):
        with Locations((0, 28.65)):
            Rectangle(SKETCH_13_OUTSIDE_W, SKETCH_13_OUTSIDE_H)
        with Locations(Location((0, 24.25, 0), (0, 0, 270))):  # turned: the seam where the file's is
            Circle(SKETCH_13_OUTSIDE_R, mode=Mode.SUBTRACT)
    extrude(amount=-CUT_EXTRUDE_8_DEPTH, mode=Mode.SUBTRACT)

    # Эскиз14 → Бобышка-Вытянуть7 (add)
    with BuildSketch(Plane.XZ.offset(127.377385485)):
        with Locations(Location((0, 24.25, 0), (0, 0, 270))):  # turned: the seam where the file's is
            Circle(SKETCH_14_R)
    extrude(amount=EXTRUDE_7_DEPTH)


solid = Compound([body_2.part, part_1.part])
